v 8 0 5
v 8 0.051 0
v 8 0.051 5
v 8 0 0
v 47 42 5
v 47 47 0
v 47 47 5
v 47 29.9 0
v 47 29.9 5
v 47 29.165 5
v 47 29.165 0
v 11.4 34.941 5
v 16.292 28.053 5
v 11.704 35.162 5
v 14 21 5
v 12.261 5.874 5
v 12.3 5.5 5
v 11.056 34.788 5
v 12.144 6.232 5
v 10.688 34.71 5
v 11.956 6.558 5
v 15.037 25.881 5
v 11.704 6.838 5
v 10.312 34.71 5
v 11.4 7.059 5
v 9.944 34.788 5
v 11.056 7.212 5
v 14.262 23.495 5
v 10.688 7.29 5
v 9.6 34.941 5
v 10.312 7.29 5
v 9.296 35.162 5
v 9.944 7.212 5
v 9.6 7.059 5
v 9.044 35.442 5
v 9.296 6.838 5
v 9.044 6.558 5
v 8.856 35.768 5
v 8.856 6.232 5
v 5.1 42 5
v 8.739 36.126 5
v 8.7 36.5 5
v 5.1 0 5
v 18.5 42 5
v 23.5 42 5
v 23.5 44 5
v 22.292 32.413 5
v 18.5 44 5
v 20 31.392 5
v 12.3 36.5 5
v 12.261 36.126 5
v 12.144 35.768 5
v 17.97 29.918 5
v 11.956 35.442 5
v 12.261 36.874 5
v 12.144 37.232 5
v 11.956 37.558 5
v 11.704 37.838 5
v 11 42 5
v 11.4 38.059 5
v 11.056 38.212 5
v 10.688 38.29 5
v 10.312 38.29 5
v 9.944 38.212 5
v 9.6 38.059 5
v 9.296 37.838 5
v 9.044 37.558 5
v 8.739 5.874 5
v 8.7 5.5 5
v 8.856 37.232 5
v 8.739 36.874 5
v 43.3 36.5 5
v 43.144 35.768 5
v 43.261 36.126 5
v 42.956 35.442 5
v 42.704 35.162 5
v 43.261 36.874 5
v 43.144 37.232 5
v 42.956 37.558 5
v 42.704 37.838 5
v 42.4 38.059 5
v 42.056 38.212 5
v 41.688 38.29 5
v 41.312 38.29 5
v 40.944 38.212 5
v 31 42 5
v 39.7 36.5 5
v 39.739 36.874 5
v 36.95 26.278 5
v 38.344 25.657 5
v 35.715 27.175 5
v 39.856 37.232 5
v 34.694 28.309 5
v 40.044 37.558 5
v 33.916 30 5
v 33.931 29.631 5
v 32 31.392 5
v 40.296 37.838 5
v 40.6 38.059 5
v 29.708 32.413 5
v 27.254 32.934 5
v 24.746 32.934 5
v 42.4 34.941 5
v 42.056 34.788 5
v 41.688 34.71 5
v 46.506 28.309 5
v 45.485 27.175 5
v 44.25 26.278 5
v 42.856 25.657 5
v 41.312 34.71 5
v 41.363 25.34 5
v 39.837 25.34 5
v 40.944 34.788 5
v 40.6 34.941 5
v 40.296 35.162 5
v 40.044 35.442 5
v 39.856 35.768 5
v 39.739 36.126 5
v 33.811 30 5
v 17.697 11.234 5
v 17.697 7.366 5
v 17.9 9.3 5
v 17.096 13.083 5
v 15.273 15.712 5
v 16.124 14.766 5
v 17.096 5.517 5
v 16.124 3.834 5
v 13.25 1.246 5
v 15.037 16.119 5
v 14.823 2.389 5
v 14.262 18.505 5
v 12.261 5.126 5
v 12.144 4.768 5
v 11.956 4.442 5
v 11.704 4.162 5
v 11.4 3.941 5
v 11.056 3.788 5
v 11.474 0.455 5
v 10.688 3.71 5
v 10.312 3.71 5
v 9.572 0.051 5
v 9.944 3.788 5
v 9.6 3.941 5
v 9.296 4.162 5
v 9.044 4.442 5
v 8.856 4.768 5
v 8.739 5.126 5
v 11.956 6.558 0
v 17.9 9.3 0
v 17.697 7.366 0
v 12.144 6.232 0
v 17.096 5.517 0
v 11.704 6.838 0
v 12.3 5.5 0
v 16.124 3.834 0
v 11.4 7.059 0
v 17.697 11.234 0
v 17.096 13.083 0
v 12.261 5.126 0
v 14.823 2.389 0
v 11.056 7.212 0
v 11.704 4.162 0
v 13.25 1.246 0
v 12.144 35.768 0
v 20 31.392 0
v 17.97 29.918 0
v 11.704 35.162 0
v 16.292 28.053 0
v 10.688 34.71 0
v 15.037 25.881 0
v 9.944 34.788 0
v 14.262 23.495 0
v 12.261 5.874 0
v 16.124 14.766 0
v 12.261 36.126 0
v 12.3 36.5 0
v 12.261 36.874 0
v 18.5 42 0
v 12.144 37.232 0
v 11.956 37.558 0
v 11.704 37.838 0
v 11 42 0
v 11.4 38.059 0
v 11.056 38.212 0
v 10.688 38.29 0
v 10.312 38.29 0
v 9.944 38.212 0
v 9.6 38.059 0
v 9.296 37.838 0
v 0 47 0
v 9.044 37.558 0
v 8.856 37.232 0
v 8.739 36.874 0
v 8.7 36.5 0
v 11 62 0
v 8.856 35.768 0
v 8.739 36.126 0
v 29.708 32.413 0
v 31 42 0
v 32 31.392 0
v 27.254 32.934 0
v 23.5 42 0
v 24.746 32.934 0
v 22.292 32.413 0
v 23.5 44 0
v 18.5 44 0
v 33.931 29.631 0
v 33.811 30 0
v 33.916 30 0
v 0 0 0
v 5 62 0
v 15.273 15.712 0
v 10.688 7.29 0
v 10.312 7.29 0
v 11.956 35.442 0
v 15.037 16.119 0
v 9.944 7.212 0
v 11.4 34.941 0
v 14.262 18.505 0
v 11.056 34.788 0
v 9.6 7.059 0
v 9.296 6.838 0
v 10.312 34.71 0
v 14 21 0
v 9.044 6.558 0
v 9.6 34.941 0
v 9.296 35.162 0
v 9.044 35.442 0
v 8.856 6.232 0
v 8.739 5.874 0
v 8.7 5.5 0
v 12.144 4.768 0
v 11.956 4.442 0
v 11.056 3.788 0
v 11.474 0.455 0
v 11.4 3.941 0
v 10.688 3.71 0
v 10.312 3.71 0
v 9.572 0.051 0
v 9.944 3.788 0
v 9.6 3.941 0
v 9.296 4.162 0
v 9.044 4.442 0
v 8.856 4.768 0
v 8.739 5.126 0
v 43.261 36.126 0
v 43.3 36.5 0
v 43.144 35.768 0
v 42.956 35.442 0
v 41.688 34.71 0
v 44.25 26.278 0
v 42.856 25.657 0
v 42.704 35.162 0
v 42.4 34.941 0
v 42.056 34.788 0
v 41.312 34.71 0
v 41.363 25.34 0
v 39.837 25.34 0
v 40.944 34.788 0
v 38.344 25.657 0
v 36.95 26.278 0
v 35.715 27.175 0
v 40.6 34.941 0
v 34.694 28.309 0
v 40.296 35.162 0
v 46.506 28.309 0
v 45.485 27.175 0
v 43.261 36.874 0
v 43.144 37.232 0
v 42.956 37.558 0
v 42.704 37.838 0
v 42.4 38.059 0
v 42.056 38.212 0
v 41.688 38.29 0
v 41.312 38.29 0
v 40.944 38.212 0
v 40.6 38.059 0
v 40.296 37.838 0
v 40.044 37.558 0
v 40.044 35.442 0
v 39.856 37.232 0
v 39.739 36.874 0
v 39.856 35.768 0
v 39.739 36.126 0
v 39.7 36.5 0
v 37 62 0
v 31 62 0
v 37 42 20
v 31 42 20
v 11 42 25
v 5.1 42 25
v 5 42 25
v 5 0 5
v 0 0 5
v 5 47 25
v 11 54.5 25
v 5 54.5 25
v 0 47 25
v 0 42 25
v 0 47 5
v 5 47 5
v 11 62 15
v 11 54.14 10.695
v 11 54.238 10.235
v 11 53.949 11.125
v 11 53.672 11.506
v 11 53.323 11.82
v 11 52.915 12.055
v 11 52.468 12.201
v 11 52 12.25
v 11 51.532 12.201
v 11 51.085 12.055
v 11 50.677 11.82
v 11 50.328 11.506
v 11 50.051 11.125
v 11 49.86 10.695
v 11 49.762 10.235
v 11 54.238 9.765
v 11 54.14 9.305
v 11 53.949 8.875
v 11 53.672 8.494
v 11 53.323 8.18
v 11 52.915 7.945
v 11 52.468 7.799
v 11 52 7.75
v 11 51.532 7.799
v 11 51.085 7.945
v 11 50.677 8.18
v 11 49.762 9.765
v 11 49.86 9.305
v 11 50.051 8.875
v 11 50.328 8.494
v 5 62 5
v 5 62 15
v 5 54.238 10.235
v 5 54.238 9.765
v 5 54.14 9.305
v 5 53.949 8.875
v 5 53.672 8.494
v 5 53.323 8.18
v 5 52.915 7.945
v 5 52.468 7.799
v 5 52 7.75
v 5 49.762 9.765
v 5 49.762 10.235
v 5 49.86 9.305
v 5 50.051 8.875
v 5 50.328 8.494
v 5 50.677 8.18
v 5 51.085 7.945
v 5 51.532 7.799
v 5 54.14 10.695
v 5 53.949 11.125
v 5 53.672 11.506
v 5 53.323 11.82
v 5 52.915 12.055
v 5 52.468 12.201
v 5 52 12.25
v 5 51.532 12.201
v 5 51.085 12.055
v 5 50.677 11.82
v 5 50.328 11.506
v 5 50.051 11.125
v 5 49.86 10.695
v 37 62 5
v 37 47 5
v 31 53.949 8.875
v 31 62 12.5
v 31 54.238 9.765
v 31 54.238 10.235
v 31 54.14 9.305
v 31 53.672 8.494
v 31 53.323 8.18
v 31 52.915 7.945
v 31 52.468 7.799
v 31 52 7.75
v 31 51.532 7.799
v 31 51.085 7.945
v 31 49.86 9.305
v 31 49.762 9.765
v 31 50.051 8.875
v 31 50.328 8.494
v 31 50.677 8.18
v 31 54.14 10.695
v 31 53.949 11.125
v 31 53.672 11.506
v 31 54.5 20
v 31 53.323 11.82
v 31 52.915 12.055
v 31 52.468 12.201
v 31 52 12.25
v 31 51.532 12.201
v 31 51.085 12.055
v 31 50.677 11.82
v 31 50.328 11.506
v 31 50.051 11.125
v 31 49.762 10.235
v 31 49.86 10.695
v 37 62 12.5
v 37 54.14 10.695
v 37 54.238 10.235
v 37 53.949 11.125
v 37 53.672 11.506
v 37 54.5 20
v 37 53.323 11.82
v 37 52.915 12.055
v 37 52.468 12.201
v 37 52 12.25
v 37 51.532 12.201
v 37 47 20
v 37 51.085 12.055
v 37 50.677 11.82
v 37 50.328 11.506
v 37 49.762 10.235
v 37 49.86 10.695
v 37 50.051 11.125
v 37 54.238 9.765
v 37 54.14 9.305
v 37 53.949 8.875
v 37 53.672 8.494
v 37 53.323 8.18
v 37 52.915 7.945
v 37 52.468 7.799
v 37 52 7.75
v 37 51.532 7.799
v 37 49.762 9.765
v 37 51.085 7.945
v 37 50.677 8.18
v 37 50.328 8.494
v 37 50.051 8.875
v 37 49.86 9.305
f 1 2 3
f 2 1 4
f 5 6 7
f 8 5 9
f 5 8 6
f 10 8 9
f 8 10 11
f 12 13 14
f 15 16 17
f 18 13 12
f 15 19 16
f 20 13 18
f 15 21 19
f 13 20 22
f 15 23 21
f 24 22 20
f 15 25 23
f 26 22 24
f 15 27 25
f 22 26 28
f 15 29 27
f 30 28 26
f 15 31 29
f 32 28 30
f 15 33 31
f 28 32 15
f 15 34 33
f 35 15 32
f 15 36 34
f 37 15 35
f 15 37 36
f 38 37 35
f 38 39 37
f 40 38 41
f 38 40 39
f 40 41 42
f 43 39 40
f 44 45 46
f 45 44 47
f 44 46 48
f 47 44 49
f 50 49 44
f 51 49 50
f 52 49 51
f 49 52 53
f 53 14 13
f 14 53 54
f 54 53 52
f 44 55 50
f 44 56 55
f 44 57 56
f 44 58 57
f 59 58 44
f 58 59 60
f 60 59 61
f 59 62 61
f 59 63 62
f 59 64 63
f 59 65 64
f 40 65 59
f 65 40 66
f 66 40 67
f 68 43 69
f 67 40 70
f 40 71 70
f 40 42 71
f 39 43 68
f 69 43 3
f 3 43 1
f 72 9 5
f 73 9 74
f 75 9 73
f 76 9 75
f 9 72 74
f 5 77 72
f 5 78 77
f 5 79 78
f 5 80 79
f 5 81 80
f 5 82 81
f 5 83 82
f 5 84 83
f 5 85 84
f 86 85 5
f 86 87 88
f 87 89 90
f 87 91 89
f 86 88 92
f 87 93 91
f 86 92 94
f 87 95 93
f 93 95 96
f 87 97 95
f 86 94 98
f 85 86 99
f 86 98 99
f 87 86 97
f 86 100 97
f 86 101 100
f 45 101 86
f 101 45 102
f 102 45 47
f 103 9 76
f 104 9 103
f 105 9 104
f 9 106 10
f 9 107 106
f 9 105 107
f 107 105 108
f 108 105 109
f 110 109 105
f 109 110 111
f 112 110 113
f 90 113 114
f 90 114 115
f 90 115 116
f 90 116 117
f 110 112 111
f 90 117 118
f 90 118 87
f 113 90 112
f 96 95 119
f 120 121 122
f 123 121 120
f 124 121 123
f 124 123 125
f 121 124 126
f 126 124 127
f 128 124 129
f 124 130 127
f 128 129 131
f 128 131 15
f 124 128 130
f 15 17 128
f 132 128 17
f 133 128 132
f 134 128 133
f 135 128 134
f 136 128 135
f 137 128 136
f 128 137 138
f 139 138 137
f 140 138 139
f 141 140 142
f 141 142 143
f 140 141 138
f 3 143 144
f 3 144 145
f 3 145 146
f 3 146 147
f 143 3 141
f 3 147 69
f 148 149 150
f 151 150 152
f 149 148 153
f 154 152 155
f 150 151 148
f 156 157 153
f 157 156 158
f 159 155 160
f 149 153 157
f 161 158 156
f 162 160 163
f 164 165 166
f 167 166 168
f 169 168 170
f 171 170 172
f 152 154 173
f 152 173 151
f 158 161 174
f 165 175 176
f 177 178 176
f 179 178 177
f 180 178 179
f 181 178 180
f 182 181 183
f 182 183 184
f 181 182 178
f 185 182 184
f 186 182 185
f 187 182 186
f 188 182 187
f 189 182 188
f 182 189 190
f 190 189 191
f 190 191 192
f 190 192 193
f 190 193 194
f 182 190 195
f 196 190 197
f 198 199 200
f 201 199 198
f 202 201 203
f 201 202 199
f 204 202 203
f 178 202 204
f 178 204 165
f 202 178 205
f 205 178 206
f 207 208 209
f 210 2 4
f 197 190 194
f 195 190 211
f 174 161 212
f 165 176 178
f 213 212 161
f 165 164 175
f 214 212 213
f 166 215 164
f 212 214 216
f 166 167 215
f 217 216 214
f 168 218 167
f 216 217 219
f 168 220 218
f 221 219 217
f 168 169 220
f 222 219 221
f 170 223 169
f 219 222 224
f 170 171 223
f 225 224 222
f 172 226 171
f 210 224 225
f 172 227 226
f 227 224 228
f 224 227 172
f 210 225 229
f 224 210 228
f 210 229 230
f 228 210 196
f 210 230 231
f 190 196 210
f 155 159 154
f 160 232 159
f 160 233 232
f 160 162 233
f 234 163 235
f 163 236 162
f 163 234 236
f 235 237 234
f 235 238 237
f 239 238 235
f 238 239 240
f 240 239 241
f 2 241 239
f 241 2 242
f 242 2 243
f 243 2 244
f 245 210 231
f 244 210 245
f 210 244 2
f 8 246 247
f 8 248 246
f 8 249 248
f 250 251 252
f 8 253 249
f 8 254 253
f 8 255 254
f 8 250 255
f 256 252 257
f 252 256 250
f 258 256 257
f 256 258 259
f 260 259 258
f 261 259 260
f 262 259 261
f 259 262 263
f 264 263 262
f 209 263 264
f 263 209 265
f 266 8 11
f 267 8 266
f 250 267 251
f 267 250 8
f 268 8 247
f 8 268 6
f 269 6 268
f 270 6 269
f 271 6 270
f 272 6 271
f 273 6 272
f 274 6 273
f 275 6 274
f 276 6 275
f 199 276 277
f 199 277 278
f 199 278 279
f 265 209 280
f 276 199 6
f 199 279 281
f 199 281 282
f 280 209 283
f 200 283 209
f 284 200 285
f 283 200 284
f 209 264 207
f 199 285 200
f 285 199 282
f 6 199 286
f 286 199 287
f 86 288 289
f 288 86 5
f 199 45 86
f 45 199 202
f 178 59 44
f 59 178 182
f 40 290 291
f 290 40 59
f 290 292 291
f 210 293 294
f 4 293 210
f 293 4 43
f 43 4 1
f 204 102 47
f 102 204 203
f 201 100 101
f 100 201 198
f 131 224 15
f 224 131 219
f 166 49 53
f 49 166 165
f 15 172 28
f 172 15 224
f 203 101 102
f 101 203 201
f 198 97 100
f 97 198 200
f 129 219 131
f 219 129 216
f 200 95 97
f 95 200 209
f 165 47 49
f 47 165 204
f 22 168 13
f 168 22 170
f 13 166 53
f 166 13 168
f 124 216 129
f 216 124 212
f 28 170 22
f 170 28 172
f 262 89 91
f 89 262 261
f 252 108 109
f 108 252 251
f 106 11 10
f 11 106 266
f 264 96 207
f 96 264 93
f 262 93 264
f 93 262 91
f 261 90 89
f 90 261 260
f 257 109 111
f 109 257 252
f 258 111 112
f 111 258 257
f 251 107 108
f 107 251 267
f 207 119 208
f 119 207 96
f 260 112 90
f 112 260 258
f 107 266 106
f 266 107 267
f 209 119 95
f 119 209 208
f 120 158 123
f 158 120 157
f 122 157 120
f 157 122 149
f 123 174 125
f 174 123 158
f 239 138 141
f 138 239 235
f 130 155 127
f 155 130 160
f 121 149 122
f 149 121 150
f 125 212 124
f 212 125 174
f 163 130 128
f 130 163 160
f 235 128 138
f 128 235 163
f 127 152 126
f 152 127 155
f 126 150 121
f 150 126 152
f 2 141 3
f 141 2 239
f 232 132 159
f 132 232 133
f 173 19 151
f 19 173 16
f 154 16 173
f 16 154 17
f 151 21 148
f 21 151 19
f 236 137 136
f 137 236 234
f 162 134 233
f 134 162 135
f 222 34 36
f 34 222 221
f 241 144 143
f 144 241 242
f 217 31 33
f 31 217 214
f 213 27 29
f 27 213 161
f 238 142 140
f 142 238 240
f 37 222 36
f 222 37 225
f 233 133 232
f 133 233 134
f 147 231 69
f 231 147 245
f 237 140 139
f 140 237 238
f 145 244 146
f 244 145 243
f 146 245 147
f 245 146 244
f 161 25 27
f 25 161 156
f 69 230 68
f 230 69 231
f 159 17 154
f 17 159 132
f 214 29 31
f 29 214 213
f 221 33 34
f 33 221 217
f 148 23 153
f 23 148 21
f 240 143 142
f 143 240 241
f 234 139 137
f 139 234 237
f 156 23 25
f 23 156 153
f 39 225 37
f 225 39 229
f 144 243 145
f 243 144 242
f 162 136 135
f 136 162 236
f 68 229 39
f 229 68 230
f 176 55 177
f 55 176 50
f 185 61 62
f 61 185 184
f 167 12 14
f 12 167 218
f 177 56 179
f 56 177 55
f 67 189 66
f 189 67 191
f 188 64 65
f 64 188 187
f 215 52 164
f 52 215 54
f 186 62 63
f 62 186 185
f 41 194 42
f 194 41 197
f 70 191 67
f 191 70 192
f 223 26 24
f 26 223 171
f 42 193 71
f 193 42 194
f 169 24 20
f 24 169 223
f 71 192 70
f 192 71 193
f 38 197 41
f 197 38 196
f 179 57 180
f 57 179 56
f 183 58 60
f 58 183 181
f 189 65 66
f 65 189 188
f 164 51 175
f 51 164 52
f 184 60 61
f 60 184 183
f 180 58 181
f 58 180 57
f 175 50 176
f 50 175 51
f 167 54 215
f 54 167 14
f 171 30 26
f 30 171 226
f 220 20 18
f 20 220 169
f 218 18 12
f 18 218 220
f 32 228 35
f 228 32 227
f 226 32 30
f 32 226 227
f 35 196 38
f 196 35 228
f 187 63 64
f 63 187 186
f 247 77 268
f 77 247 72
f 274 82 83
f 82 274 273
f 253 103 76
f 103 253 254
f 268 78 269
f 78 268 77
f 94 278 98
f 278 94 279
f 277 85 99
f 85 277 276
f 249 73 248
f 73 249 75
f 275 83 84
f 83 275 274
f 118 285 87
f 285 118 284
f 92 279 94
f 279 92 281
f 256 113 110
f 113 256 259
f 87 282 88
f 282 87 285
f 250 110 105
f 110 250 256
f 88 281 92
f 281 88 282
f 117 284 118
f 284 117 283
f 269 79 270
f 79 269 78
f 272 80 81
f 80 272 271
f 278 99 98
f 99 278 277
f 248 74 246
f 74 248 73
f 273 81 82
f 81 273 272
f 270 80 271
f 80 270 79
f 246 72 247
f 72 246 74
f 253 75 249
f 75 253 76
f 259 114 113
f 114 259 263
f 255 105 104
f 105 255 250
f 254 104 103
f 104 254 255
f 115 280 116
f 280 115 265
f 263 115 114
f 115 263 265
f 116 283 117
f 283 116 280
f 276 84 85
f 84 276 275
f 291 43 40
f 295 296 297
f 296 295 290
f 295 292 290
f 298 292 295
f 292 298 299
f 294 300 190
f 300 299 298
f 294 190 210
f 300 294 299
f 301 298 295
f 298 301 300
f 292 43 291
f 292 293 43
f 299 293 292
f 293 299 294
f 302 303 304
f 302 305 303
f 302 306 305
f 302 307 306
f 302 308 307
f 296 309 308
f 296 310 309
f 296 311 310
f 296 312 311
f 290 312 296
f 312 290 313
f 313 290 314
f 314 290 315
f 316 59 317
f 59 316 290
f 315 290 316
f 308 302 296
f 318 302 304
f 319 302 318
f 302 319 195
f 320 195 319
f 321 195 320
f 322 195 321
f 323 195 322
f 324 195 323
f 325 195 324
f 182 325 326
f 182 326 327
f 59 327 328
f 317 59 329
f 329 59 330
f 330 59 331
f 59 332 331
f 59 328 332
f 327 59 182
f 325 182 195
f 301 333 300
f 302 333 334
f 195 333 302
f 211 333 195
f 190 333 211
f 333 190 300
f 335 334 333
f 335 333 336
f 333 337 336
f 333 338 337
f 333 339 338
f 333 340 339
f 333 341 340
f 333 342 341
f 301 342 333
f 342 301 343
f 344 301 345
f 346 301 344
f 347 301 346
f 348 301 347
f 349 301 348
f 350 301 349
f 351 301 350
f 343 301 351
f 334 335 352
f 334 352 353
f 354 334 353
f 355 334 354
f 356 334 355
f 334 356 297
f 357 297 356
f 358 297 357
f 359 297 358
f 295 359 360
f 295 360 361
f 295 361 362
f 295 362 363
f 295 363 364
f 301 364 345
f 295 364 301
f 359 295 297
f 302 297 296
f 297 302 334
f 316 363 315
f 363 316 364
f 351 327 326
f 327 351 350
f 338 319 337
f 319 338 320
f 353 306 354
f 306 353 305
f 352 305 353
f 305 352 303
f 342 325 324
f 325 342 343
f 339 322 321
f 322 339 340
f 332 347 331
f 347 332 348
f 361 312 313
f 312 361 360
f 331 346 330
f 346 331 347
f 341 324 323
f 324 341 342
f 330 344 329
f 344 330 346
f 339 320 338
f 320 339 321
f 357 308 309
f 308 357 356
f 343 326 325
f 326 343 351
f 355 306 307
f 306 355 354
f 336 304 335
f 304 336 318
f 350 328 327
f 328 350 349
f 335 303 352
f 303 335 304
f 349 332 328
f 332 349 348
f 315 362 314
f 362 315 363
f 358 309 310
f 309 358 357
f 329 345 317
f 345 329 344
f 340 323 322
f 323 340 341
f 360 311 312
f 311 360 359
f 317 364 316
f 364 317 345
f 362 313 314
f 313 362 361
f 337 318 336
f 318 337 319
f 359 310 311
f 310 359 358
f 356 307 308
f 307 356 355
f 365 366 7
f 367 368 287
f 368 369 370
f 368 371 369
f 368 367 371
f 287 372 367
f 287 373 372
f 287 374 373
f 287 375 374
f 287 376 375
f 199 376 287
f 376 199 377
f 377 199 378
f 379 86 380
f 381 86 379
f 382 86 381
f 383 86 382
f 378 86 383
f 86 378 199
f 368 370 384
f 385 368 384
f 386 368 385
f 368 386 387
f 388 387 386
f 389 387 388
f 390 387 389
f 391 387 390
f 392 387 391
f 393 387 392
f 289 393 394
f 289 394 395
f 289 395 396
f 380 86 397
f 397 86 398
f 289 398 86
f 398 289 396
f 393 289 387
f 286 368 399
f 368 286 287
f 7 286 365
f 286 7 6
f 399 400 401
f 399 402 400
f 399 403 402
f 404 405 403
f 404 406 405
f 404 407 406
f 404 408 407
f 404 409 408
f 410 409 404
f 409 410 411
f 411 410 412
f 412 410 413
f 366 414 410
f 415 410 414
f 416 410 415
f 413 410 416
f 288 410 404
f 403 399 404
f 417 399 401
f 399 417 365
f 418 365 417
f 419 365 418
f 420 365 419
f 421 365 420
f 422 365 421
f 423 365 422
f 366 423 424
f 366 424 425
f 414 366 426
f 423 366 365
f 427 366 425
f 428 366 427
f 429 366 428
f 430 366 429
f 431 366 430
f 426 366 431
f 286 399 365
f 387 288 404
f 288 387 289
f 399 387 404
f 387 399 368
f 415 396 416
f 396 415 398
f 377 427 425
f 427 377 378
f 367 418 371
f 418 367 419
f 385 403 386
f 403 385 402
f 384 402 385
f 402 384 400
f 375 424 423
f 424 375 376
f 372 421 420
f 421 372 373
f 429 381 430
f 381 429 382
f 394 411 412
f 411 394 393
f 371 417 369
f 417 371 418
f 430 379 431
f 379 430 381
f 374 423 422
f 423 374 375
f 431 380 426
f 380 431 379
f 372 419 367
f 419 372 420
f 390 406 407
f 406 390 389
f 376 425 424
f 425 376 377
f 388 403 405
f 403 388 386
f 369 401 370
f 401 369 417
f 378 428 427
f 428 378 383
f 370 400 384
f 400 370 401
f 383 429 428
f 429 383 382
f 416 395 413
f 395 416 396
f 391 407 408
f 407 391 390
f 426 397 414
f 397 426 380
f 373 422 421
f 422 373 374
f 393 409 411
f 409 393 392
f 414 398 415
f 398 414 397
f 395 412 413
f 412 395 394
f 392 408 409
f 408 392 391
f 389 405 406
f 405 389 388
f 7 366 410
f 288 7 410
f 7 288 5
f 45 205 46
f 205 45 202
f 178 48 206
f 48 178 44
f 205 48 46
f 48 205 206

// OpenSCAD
// file: metric.scad
// PRUSA Mendel  
// Default metric sizes
// GNU GPL v2
// Josef Průša
// josefprusa@me.com
// prusadjs.cz
// http://www.reprap.org/wiki/Prusa_Mendel
// http://github.com/prusajr/PrusaMendel

// DONT CHANGE THIS FILE! ALTER VALUES IN CONFIGURATION.SCAD INSTEAD

// RODS

threaded_rod_diameter = 8.2;
threaded_rod_diameter_horizontal = 8.2;
smooth_bar_diameter = 8;
smooth_bar_diameter_horizontal = 8.5;

// Nuts and bolts

m8_diameter = 9;
m8_nut_diameter = 16.4;

m4_diameter = 4.5;
m4_nut_diameter = 9;

m3_diameter = 3.6;
m3_nut_diameter = 6.1;

// Bushing holder

bushing_core_diameter = smooth_bar_diameter;
bushing_material_thickness = 1;

// Motors

motor_shaft = 5.5;
// main file
// C. Strang	
// F. Beachler

h = 5;   	// base thickness
hh=6;
o = 0.1;	//  overlap amount
w=2.5;			// wall thickness
fmp = false;	// four mount points
st=2;

//import("../dist/stl/y-motor-bracket.stl");

include <metric.scad>;

m3=m3_diameter ; 
m4=m4_diameter ; 
m8=smooth_bar_diameter_horizontal;

$fn=30;

translate([0,0,0]) ymotormount();

module ymotormount()
{
	translate([5,0,0]) nema17motormount(h,fmp);
	translate([0,0,0]) rotate([0,0,0]) walls();
}


module nema17motormount(pt,mp)
{
	difference()
	{
		union()
		{
			difference()
			{
				translate([0,0,0]) rotate([0,0,0]) cube([42,42,pt]);
		
				translate([21,21,-0.1]) cylinder(r=12,h=pt+2*o);
				if (mp==false)
				{
					translate([28,-0.1,-o])  cube([25,30,21]);
					translate([3,-0.1,-o])  cube([36,15,21]);
				}
		
			}
			
			if (mp==false) difference()
			{
				translate([35.6,32.6,0]) cylinder(r=7.3,h=pt);
				translate([42,28,-o]) cube([5,10,pt+2*o]);
				translate([28,30,-o]) cube([17,10,pt+2*o]);
			}
		
			if (mp==false) translate([1,0,0]) difference()
			{
				translate([2.6,9.3,0]) cylinder(r=9.3,h=pt);
				translate([-8,0,-o]) cube([7,20,pt+2*o]);
			}
		}
		translate([5.5,5.5,-o]) cylinder(r=m3/2,h=pt+2*o);
		translate([5.5,36.5,-o]) cylinder(r=m3/2,h=pt+2*o);
		translate([36.5,36.5,-o]) cylinder(r=m3/2,h=pt+2*o);
		if (mp==true)
		{
			translate([36.5,5.5,-o]) cylinder(r=m3/2,h=pt+2*o);
	
		}
	}
}


module walls()
{
	difference()
	{
			translate([0,0,0]) rotate([0,0,0]) cube([h+o,47,25]);
			translate([-o,0,h]) rotate([atan(20/42),0,0]) cube([h+3*o,47,25]);
	}
	difference()
	{
			translate([0,42,0]) rotate([0,0,0]) cube([11,20,h]);
			translate([0,47,-o]) rotate([0,0,-atan(5/15)]) mirror([1,0,0]) cube([10,20,h+3*o]);
	}
	difference()
	{
			translate([h,42,0]) rotate([0,0,0]) cube([hh,20,25]);
			translate([h-o,62,15]) rotate([atan(7.5/10),0,0]) cube([hh+2*o,20,25]);
			translate([h-o,52,10]) rotate([0,90,0]) cylinder(r=m4/2,h=hh+2*o);
	}

	difference()
	{
			translate([31,42,0]) rotate([0,0,0]) cube([16,20,h]);
			translate([47,47,-o]) rotate([0,0,atan(10/15)]) mirror([0,0,0]) cube([10,20,h+3*o]);
	}
	difference()
	{
			translate([31,42,0]) rotate([0,0,0]) cube([hh,20,20]);
			translate([31-o,62,12.5]) rotate([atan(7.5/7.5),0,0]) cube([hh+2*o,20,25]);
			translate([31-o,52,10]) rotate([0,90,0]) cylinder(r=m4/2,h=hh+2*o);
	}
	difference()
	{
			translate([31,42,0]) rotate([0,0,0]) cube([16,h,20]);
			translate([47,42-o,h]) rotate([0,-atan(10/15),0]) mirror([0,0,0]) cube([16,h+3*o,20]);
	}

	translate([18.5,42,0]) rotate([0,0,0]) cube([5,st,h]);



}
